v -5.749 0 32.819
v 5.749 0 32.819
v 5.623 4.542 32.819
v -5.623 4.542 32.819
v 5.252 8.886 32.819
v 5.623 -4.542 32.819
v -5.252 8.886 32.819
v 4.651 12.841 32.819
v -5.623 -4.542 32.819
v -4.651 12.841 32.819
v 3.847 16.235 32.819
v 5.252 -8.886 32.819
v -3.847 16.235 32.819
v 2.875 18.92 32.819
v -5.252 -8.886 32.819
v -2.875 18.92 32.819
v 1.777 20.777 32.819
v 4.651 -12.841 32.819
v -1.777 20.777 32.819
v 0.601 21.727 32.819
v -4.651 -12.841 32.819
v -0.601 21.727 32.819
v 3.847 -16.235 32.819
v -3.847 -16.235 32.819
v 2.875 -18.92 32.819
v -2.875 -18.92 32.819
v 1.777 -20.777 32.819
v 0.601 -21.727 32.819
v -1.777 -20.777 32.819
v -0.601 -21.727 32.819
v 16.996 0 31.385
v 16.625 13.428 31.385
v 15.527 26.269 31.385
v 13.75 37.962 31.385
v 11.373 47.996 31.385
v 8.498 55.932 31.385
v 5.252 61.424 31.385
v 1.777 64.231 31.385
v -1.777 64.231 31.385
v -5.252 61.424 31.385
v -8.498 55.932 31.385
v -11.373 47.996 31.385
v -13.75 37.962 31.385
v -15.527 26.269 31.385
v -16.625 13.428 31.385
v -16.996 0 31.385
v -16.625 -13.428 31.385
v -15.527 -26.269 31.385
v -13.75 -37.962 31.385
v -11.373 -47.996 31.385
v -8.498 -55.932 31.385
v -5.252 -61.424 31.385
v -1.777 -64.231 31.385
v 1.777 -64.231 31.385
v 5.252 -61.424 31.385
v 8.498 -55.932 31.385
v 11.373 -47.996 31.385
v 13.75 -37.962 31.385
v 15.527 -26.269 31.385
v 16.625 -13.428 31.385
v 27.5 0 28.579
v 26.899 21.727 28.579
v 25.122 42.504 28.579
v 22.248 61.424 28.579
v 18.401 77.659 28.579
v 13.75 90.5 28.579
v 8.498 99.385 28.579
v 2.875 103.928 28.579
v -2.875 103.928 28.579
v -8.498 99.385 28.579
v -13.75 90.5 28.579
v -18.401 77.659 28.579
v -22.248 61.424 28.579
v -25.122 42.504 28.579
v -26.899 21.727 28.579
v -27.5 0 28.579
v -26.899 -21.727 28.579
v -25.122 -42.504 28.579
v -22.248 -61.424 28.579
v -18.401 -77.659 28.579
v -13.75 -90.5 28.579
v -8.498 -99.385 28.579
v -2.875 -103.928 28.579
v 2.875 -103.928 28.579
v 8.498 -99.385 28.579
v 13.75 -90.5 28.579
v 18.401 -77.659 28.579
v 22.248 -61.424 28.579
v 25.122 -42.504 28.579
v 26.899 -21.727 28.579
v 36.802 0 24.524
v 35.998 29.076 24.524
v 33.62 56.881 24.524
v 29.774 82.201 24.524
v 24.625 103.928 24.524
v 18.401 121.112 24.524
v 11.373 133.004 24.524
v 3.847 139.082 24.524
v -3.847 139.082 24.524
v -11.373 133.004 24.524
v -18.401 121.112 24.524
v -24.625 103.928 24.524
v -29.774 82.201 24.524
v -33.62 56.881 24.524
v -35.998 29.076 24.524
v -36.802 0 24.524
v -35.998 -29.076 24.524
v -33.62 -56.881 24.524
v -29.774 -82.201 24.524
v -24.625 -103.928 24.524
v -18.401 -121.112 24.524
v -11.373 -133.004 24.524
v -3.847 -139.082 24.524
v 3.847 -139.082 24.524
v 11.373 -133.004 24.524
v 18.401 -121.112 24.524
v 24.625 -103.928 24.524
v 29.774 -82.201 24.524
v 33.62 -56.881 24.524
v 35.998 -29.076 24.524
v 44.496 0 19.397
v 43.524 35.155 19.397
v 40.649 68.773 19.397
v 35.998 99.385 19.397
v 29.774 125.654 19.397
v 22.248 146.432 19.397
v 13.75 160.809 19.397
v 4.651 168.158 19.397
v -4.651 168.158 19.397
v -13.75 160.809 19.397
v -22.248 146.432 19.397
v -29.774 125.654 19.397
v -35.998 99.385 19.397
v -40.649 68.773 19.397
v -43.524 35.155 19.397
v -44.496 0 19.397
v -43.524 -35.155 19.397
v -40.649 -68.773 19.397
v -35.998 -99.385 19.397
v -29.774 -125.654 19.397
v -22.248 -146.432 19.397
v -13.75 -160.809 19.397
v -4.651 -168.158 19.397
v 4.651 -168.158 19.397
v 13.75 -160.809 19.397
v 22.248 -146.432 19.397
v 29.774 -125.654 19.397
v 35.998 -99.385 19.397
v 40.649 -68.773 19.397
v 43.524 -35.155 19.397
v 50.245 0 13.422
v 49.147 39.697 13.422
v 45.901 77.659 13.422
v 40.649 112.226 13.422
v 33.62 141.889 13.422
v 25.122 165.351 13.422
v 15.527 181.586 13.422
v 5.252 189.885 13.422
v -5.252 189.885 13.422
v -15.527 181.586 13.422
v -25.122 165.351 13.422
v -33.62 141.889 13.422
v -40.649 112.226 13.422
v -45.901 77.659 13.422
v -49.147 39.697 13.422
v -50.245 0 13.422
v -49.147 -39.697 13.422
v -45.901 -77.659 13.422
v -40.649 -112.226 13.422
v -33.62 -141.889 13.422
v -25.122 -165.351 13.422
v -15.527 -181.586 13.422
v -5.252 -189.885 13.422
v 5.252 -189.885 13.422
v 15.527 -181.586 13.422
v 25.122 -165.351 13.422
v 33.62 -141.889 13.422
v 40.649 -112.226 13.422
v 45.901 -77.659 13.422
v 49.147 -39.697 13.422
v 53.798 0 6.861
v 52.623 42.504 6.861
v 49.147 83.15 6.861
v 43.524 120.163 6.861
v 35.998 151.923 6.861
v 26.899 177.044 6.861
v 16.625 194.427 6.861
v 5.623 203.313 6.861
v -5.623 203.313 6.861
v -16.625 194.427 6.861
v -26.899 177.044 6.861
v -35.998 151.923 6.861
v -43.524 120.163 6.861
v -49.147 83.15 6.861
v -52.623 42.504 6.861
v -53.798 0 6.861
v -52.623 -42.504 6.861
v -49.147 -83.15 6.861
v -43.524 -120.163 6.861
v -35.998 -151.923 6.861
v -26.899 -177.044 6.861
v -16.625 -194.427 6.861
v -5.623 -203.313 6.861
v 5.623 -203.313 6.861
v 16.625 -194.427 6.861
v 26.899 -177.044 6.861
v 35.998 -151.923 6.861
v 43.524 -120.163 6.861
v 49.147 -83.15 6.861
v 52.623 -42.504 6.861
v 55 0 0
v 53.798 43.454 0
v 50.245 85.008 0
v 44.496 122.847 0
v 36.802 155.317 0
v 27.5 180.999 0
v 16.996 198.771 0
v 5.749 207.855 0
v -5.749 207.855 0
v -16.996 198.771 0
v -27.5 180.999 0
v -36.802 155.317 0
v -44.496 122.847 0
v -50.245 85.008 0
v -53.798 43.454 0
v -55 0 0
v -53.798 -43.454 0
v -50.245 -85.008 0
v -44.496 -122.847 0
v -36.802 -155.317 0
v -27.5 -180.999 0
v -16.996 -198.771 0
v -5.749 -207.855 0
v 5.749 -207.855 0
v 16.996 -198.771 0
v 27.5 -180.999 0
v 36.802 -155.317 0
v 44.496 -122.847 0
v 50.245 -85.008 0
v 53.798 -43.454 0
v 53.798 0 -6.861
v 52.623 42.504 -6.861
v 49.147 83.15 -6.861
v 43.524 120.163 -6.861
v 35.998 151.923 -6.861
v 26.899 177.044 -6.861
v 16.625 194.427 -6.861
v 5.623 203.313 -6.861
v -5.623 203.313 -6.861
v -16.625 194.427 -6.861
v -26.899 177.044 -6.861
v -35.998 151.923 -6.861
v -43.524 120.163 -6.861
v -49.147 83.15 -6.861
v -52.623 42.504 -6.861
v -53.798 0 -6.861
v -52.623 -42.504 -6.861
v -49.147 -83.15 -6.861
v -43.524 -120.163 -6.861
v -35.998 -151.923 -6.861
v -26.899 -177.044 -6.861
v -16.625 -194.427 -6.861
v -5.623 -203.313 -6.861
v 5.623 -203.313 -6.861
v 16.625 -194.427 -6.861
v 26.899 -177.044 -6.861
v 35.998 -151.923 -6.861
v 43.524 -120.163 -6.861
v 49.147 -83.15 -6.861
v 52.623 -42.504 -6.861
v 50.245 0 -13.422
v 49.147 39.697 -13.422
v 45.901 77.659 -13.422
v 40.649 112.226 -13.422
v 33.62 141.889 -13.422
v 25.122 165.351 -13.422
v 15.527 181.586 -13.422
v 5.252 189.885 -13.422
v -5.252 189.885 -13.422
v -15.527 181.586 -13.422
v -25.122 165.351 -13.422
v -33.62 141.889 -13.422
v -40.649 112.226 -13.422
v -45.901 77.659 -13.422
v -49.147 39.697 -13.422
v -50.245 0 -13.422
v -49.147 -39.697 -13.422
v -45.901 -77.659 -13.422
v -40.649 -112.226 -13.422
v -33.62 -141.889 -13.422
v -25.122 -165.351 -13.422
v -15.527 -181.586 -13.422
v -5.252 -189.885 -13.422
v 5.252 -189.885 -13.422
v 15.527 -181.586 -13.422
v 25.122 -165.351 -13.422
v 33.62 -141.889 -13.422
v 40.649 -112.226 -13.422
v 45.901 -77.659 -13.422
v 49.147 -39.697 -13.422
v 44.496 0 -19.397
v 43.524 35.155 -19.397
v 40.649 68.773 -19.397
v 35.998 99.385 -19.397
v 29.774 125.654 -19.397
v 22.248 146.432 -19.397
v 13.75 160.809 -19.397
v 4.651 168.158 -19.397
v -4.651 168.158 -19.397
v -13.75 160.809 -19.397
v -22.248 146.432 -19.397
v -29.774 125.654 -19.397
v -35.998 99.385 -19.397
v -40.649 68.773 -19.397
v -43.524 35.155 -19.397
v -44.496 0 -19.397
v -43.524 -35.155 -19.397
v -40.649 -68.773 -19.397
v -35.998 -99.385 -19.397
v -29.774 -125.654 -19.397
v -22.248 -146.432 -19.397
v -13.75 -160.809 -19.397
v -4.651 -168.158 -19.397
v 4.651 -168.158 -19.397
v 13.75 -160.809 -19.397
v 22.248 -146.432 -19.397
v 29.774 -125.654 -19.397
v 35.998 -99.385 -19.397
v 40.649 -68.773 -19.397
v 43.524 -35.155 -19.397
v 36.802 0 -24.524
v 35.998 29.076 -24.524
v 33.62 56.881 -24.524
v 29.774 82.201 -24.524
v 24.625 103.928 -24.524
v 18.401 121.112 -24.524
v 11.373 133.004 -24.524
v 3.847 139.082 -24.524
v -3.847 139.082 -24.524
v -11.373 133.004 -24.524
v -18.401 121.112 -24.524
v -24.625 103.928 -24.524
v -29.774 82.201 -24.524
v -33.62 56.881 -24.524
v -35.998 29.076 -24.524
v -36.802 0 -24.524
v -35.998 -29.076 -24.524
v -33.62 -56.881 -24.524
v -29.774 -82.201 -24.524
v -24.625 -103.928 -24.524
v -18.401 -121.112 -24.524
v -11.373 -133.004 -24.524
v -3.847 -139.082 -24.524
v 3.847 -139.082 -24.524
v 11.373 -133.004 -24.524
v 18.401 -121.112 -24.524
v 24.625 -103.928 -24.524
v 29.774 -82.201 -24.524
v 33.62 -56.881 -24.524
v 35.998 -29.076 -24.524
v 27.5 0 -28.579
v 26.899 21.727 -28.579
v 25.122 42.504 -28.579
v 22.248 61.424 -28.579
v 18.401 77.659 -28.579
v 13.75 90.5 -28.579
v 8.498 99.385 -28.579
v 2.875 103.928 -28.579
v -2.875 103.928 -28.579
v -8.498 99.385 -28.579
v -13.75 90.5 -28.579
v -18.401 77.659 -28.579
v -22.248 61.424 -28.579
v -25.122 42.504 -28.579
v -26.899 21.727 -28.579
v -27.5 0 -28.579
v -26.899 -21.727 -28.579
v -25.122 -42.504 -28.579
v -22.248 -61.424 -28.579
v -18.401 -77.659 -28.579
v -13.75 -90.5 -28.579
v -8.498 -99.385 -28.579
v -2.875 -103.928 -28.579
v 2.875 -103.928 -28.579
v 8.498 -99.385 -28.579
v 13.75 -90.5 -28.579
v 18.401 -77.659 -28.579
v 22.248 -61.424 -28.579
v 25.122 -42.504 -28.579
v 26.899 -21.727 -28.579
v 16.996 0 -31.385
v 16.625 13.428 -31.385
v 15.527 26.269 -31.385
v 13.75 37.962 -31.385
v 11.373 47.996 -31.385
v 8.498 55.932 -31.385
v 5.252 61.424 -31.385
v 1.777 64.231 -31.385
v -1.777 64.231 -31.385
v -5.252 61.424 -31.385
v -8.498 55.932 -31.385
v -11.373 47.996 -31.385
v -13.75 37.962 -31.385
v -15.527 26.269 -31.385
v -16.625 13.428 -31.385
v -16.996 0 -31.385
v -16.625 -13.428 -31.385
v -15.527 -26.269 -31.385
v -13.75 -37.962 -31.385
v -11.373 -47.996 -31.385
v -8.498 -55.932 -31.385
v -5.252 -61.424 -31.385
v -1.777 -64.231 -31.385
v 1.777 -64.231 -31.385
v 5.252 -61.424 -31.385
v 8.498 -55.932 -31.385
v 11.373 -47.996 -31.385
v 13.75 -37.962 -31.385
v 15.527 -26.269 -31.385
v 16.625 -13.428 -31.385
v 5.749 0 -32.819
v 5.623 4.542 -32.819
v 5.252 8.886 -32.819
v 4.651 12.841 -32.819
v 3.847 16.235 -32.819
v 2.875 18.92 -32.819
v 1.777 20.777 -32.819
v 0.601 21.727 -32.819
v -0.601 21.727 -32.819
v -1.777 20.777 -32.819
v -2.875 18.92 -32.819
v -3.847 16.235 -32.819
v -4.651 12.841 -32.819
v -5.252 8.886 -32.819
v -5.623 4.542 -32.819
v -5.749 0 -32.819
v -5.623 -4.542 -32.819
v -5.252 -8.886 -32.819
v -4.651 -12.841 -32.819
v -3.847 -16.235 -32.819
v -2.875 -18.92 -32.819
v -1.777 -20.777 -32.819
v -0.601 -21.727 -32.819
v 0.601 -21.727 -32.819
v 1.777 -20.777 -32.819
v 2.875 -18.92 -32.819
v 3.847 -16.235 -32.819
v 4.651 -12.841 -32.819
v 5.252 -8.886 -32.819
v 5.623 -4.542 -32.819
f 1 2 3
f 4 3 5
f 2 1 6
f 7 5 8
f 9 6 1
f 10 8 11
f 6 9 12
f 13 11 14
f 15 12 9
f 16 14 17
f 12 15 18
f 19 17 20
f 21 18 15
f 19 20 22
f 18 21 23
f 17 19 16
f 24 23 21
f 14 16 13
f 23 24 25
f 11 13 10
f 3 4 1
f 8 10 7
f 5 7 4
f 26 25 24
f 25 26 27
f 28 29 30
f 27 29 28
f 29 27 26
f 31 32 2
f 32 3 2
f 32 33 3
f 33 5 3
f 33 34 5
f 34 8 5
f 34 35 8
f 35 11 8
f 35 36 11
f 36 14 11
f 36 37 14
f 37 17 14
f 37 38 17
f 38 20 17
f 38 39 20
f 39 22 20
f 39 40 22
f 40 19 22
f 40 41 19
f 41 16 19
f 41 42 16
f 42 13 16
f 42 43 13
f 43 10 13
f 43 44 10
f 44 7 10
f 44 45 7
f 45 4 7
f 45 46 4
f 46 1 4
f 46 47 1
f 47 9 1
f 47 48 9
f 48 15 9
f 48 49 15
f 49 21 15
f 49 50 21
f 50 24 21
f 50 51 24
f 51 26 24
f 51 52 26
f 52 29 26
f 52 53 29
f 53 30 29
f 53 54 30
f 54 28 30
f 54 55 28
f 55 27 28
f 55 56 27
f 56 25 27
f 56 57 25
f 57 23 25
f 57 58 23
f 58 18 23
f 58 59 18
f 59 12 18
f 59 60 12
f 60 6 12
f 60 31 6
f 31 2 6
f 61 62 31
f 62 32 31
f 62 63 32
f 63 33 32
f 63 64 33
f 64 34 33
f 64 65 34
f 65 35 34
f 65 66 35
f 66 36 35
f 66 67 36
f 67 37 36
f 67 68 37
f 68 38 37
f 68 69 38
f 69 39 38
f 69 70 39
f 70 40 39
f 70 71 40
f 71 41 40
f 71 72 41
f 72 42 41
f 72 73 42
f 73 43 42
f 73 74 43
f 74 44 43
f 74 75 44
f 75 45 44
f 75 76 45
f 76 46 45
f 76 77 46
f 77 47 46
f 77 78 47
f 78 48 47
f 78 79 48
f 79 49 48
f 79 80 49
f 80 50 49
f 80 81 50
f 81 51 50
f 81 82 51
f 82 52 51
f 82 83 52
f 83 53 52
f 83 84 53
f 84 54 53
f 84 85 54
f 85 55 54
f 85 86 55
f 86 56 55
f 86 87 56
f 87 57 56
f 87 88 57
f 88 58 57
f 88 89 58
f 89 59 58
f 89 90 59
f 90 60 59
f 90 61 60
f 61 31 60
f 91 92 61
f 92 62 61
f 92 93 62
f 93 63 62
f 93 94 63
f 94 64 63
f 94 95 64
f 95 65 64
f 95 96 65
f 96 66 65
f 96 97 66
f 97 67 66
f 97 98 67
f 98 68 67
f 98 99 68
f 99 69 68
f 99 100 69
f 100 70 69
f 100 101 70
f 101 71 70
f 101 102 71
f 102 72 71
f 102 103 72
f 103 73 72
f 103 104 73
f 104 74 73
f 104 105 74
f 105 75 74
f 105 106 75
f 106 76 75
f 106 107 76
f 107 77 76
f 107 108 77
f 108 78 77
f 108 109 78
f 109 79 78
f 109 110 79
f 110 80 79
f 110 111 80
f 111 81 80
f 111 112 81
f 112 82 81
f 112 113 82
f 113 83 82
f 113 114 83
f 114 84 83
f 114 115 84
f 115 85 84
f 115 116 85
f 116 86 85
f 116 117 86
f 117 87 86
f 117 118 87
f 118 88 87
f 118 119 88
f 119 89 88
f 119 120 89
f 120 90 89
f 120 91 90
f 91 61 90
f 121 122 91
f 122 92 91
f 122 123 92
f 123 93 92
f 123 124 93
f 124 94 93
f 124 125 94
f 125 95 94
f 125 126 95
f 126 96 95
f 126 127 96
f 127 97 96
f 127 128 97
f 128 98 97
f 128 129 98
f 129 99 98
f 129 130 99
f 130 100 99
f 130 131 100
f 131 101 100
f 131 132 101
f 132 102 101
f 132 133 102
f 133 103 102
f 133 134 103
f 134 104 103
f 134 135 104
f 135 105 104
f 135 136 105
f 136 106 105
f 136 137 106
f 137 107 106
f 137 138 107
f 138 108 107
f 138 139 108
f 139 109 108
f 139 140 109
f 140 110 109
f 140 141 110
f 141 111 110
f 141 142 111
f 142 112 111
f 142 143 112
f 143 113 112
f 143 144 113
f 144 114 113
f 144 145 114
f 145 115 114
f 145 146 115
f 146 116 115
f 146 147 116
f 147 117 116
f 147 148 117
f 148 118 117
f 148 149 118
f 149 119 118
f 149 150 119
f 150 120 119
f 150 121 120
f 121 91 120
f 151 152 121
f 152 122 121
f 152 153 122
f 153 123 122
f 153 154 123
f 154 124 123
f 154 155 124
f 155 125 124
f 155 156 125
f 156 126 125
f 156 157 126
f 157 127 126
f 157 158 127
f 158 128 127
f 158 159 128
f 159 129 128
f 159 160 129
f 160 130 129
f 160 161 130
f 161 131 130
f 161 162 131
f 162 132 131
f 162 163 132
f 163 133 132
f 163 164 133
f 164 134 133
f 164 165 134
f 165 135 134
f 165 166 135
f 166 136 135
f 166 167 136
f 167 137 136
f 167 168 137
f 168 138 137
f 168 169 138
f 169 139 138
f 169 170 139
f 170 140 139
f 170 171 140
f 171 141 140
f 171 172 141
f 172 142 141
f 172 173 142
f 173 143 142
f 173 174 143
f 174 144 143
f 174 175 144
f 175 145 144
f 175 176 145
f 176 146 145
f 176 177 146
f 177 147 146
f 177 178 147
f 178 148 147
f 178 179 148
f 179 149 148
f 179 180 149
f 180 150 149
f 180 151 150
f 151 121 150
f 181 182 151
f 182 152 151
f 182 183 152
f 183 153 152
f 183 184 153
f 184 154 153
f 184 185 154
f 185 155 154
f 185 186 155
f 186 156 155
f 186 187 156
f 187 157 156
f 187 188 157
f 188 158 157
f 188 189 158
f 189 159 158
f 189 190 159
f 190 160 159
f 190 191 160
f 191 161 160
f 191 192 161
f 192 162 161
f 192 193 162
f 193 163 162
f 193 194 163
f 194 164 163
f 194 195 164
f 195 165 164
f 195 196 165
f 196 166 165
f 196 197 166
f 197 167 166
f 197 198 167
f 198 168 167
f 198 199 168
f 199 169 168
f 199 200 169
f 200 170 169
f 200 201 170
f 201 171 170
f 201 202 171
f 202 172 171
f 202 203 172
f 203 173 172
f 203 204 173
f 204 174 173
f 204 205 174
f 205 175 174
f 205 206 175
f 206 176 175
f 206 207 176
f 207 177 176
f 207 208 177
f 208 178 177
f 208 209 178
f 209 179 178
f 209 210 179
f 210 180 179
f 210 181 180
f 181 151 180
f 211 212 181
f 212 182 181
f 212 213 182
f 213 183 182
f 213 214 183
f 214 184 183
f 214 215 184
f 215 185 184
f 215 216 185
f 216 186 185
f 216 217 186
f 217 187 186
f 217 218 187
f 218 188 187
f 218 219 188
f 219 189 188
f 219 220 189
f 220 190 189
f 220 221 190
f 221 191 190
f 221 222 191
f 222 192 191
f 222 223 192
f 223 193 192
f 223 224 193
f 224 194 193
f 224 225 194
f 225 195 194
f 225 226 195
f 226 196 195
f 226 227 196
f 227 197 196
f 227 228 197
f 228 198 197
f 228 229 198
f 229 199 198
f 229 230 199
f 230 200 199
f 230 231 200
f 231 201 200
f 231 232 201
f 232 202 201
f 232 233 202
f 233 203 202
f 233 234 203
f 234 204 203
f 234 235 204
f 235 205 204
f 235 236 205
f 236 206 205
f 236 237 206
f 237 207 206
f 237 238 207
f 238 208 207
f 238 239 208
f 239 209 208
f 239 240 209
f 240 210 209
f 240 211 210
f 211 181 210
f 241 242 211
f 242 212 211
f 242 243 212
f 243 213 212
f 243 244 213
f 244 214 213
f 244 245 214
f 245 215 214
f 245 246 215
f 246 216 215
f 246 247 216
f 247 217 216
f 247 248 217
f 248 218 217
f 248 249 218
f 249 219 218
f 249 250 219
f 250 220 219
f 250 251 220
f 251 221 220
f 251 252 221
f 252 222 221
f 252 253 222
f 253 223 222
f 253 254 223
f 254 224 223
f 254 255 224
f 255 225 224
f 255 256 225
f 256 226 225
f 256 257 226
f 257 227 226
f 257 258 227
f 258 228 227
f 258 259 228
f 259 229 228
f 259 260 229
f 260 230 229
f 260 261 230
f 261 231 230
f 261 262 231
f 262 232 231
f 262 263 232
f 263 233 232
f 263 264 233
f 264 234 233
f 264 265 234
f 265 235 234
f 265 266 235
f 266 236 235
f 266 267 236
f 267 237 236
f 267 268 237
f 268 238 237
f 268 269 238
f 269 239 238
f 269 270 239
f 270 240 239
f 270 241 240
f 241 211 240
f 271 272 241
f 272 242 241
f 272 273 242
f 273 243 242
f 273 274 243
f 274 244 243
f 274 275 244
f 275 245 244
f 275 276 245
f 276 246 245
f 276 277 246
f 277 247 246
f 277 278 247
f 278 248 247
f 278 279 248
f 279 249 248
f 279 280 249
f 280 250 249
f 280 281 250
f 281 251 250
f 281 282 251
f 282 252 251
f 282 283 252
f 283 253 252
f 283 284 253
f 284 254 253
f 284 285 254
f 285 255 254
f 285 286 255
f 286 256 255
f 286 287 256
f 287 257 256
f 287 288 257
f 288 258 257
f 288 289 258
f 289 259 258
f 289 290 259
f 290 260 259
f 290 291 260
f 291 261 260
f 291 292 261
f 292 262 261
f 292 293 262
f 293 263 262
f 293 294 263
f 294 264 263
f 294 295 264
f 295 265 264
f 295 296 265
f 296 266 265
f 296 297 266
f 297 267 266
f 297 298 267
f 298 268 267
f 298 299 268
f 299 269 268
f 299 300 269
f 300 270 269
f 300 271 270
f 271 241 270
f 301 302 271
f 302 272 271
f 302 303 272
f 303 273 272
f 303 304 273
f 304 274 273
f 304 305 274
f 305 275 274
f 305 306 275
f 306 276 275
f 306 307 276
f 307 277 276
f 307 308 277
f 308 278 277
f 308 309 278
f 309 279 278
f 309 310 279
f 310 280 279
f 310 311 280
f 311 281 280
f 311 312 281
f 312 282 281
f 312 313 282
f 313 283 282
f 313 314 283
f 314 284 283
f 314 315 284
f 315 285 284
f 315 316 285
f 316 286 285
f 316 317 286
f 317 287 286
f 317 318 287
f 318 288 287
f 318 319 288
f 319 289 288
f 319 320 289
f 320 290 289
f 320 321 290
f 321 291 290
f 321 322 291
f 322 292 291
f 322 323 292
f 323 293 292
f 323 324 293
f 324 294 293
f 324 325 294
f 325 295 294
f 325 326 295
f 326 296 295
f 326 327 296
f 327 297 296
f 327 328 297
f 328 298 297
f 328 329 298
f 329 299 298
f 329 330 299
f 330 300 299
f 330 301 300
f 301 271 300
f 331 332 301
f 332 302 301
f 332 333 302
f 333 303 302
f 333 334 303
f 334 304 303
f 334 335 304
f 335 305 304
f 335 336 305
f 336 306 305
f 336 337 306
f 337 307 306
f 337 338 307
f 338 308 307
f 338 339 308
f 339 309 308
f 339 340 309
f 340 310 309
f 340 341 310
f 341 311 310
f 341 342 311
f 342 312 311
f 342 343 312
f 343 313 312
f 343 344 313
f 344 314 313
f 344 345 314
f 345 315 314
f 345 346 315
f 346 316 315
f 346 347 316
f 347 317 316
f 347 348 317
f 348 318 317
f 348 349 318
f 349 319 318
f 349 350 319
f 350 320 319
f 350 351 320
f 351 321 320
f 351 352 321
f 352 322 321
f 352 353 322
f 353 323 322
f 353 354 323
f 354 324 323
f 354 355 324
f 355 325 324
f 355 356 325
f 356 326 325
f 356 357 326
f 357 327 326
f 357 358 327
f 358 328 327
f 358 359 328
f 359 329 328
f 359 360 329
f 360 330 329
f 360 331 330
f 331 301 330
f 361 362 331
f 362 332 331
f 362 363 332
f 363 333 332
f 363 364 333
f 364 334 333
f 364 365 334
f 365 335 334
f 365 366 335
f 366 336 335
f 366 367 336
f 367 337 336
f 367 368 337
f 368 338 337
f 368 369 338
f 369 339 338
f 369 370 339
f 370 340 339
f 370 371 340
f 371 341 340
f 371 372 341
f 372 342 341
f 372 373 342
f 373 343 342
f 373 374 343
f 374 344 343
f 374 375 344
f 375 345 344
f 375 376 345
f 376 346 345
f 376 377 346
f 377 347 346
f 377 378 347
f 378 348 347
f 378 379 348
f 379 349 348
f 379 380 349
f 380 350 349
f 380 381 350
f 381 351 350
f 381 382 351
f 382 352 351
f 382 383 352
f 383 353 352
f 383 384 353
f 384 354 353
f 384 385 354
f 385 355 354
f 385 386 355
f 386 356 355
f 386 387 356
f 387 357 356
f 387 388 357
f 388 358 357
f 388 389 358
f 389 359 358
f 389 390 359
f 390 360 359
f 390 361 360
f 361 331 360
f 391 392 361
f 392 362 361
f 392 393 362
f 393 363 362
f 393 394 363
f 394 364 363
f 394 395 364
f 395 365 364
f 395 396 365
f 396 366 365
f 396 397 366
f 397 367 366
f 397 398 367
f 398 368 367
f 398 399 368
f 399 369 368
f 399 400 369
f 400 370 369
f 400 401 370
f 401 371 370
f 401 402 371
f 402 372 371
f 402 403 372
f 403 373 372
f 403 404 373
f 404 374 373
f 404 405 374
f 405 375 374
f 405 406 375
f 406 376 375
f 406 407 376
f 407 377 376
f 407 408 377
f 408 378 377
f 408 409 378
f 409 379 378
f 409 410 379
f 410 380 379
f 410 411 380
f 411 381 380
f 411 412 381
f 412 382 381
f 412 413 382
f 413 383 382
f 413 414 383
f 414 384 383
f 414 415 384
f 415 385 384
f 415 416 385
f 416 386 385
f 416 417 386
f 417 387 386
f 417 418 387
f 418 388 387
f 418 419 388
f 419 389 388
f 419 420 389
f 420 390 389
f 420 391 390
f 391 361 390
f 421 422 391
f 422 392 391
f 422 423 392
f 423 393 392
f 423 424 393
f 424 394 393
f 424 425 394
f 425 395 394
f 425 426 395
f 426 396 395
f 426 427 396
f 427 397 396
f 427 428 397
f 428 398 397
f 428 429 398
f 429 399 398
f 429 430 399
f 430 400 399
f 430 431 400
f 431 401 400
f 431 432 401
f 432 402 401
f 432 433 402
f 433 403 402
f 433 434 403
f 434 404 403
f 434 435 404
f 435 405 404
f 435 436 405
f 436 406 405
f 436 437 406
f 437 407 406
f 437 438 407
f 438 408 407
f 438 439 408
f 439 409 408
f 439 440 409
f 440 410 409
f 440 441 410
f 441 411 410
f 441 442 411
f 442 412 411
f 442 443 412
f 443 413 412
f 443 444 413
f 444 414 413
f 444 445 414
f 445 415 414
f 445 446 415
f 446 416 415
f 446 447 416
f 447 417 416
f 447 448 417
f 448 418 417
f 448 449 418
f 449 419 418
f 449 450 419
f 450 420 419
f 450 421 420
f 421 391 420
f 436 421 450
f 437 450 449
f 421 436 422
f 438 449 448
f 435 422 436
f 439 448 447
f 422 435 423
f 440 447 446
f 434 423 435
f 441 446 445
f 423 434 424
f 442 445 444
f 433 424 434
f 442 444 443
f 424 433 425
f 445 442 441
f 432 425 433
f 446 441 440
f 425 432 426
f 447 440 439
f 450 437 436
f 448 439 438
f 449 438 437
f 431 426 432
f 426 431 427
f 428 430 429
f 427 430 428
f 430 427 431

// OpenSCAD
// Generated by SolidPython 1.0.1 on 2020-07-29 00:46:47


scale(v = [5, 19, 3]) {
	sphere(r = 11);
}
/***********************************************
*********      SolidPython code:      **********
************************************************
 
# import packages: SolidPython
from solid import *
from solid.utils import *
from itertools import chain, combinations, permutations


class Resize:

    def __init__(self, scad_file):
        self.scad_file = scad_file
        #self.scad_file = import_scad(scad_file)
        # cone/cylinder param:
        self.r1 = 0
        self.r2 = 0
        self.h = 0
        # rectangular prism param:
        self.w = 0
        self.l = 0
        # ellipse param:
        self.r = 0

    # import OpenScad code (file name corresponds to shape)


    # classify shape + parameters
    def assign(self, param1, param2, param3):
        if self.scad_file == 'cone.scad':
            self.r1 = param1
            self.r2 = param2
            self.h = param3
        elif self.scad_file == 'cylinder.scad':
            self.r1 = param1
            self.r2 = param2
            self.h = param3
        elif self.scad_file == 'rectangularPrism.scad':
            self.h = param1
            self.l = param2
            self.w = param3
        else:
            self.r = param1
            self.h = param2

    # resize parameters
    def iterate(self):
        x = range(3, 20, 2)
        i = 1
        if self.scad_file == 'cone.scad':
            tempList = list(permutations(x, 2))
            for temp in tempList:
                param1 = temp[0]
                param2 = temp[1]
                filepath = 'produced_scad_files/' + 'cone' + str(param1) + '_' + str(param2) + '_' + '.scad'
                scad_render_to_file(cylinder(h=param1, r1=param2, r2=0), filepath)

        elif self.scad_file == 'cylinder.scad':
            tempList = list(permutations(x, 3))
            for temp in tempList:
                param1 = temp[0]
                param2 = temp[1]
                filepath = 'produced_scad_files/' + 'cylinder' + str(param1) + '_' + str(param2) + '_' + '.scad'
                scad_render_to_file(cylinder(h=param1, r1=param2, r2=param2), filepath)

        elif self.scad_file == 'rectangularPrism.scad':
            tempList = list(permutations(x, 3))
            for temp in tempList:
                param1 = temp[0]
                param2 = temp[1]
                param3 = temp[2]
                filepath = 'produced_scad_files/' + 'rectangularPrism' + str(param1) + '_' + str(param2) + '_' + str(
                    param3) + '.scad'
                scad_render_to_file(cube(size=(param1, param2, param3)), filepath)

        elif self.scad_file == 'ellipse.scad':
            tempList = list(permutations(x, 4))
            for temp in tempList:
                param1 = temp[0]
                param2 = temp[1]
                param3 = temp[2]
                param4 = temp[3]
                filepath = 'produced_scad_files/' + 'ellipse' + str(param1) + '_' + str(param2) + '_' + str(param3) + '_' + str(param4) + '.scad'
                scad_render_to_file(scale([param1, param2, param3])(sphere(r=param4)), filepath)

    def render_to_scadfile(self):
        scad_render_to_file(scad, 'example.scad') 
 
************************************************/
